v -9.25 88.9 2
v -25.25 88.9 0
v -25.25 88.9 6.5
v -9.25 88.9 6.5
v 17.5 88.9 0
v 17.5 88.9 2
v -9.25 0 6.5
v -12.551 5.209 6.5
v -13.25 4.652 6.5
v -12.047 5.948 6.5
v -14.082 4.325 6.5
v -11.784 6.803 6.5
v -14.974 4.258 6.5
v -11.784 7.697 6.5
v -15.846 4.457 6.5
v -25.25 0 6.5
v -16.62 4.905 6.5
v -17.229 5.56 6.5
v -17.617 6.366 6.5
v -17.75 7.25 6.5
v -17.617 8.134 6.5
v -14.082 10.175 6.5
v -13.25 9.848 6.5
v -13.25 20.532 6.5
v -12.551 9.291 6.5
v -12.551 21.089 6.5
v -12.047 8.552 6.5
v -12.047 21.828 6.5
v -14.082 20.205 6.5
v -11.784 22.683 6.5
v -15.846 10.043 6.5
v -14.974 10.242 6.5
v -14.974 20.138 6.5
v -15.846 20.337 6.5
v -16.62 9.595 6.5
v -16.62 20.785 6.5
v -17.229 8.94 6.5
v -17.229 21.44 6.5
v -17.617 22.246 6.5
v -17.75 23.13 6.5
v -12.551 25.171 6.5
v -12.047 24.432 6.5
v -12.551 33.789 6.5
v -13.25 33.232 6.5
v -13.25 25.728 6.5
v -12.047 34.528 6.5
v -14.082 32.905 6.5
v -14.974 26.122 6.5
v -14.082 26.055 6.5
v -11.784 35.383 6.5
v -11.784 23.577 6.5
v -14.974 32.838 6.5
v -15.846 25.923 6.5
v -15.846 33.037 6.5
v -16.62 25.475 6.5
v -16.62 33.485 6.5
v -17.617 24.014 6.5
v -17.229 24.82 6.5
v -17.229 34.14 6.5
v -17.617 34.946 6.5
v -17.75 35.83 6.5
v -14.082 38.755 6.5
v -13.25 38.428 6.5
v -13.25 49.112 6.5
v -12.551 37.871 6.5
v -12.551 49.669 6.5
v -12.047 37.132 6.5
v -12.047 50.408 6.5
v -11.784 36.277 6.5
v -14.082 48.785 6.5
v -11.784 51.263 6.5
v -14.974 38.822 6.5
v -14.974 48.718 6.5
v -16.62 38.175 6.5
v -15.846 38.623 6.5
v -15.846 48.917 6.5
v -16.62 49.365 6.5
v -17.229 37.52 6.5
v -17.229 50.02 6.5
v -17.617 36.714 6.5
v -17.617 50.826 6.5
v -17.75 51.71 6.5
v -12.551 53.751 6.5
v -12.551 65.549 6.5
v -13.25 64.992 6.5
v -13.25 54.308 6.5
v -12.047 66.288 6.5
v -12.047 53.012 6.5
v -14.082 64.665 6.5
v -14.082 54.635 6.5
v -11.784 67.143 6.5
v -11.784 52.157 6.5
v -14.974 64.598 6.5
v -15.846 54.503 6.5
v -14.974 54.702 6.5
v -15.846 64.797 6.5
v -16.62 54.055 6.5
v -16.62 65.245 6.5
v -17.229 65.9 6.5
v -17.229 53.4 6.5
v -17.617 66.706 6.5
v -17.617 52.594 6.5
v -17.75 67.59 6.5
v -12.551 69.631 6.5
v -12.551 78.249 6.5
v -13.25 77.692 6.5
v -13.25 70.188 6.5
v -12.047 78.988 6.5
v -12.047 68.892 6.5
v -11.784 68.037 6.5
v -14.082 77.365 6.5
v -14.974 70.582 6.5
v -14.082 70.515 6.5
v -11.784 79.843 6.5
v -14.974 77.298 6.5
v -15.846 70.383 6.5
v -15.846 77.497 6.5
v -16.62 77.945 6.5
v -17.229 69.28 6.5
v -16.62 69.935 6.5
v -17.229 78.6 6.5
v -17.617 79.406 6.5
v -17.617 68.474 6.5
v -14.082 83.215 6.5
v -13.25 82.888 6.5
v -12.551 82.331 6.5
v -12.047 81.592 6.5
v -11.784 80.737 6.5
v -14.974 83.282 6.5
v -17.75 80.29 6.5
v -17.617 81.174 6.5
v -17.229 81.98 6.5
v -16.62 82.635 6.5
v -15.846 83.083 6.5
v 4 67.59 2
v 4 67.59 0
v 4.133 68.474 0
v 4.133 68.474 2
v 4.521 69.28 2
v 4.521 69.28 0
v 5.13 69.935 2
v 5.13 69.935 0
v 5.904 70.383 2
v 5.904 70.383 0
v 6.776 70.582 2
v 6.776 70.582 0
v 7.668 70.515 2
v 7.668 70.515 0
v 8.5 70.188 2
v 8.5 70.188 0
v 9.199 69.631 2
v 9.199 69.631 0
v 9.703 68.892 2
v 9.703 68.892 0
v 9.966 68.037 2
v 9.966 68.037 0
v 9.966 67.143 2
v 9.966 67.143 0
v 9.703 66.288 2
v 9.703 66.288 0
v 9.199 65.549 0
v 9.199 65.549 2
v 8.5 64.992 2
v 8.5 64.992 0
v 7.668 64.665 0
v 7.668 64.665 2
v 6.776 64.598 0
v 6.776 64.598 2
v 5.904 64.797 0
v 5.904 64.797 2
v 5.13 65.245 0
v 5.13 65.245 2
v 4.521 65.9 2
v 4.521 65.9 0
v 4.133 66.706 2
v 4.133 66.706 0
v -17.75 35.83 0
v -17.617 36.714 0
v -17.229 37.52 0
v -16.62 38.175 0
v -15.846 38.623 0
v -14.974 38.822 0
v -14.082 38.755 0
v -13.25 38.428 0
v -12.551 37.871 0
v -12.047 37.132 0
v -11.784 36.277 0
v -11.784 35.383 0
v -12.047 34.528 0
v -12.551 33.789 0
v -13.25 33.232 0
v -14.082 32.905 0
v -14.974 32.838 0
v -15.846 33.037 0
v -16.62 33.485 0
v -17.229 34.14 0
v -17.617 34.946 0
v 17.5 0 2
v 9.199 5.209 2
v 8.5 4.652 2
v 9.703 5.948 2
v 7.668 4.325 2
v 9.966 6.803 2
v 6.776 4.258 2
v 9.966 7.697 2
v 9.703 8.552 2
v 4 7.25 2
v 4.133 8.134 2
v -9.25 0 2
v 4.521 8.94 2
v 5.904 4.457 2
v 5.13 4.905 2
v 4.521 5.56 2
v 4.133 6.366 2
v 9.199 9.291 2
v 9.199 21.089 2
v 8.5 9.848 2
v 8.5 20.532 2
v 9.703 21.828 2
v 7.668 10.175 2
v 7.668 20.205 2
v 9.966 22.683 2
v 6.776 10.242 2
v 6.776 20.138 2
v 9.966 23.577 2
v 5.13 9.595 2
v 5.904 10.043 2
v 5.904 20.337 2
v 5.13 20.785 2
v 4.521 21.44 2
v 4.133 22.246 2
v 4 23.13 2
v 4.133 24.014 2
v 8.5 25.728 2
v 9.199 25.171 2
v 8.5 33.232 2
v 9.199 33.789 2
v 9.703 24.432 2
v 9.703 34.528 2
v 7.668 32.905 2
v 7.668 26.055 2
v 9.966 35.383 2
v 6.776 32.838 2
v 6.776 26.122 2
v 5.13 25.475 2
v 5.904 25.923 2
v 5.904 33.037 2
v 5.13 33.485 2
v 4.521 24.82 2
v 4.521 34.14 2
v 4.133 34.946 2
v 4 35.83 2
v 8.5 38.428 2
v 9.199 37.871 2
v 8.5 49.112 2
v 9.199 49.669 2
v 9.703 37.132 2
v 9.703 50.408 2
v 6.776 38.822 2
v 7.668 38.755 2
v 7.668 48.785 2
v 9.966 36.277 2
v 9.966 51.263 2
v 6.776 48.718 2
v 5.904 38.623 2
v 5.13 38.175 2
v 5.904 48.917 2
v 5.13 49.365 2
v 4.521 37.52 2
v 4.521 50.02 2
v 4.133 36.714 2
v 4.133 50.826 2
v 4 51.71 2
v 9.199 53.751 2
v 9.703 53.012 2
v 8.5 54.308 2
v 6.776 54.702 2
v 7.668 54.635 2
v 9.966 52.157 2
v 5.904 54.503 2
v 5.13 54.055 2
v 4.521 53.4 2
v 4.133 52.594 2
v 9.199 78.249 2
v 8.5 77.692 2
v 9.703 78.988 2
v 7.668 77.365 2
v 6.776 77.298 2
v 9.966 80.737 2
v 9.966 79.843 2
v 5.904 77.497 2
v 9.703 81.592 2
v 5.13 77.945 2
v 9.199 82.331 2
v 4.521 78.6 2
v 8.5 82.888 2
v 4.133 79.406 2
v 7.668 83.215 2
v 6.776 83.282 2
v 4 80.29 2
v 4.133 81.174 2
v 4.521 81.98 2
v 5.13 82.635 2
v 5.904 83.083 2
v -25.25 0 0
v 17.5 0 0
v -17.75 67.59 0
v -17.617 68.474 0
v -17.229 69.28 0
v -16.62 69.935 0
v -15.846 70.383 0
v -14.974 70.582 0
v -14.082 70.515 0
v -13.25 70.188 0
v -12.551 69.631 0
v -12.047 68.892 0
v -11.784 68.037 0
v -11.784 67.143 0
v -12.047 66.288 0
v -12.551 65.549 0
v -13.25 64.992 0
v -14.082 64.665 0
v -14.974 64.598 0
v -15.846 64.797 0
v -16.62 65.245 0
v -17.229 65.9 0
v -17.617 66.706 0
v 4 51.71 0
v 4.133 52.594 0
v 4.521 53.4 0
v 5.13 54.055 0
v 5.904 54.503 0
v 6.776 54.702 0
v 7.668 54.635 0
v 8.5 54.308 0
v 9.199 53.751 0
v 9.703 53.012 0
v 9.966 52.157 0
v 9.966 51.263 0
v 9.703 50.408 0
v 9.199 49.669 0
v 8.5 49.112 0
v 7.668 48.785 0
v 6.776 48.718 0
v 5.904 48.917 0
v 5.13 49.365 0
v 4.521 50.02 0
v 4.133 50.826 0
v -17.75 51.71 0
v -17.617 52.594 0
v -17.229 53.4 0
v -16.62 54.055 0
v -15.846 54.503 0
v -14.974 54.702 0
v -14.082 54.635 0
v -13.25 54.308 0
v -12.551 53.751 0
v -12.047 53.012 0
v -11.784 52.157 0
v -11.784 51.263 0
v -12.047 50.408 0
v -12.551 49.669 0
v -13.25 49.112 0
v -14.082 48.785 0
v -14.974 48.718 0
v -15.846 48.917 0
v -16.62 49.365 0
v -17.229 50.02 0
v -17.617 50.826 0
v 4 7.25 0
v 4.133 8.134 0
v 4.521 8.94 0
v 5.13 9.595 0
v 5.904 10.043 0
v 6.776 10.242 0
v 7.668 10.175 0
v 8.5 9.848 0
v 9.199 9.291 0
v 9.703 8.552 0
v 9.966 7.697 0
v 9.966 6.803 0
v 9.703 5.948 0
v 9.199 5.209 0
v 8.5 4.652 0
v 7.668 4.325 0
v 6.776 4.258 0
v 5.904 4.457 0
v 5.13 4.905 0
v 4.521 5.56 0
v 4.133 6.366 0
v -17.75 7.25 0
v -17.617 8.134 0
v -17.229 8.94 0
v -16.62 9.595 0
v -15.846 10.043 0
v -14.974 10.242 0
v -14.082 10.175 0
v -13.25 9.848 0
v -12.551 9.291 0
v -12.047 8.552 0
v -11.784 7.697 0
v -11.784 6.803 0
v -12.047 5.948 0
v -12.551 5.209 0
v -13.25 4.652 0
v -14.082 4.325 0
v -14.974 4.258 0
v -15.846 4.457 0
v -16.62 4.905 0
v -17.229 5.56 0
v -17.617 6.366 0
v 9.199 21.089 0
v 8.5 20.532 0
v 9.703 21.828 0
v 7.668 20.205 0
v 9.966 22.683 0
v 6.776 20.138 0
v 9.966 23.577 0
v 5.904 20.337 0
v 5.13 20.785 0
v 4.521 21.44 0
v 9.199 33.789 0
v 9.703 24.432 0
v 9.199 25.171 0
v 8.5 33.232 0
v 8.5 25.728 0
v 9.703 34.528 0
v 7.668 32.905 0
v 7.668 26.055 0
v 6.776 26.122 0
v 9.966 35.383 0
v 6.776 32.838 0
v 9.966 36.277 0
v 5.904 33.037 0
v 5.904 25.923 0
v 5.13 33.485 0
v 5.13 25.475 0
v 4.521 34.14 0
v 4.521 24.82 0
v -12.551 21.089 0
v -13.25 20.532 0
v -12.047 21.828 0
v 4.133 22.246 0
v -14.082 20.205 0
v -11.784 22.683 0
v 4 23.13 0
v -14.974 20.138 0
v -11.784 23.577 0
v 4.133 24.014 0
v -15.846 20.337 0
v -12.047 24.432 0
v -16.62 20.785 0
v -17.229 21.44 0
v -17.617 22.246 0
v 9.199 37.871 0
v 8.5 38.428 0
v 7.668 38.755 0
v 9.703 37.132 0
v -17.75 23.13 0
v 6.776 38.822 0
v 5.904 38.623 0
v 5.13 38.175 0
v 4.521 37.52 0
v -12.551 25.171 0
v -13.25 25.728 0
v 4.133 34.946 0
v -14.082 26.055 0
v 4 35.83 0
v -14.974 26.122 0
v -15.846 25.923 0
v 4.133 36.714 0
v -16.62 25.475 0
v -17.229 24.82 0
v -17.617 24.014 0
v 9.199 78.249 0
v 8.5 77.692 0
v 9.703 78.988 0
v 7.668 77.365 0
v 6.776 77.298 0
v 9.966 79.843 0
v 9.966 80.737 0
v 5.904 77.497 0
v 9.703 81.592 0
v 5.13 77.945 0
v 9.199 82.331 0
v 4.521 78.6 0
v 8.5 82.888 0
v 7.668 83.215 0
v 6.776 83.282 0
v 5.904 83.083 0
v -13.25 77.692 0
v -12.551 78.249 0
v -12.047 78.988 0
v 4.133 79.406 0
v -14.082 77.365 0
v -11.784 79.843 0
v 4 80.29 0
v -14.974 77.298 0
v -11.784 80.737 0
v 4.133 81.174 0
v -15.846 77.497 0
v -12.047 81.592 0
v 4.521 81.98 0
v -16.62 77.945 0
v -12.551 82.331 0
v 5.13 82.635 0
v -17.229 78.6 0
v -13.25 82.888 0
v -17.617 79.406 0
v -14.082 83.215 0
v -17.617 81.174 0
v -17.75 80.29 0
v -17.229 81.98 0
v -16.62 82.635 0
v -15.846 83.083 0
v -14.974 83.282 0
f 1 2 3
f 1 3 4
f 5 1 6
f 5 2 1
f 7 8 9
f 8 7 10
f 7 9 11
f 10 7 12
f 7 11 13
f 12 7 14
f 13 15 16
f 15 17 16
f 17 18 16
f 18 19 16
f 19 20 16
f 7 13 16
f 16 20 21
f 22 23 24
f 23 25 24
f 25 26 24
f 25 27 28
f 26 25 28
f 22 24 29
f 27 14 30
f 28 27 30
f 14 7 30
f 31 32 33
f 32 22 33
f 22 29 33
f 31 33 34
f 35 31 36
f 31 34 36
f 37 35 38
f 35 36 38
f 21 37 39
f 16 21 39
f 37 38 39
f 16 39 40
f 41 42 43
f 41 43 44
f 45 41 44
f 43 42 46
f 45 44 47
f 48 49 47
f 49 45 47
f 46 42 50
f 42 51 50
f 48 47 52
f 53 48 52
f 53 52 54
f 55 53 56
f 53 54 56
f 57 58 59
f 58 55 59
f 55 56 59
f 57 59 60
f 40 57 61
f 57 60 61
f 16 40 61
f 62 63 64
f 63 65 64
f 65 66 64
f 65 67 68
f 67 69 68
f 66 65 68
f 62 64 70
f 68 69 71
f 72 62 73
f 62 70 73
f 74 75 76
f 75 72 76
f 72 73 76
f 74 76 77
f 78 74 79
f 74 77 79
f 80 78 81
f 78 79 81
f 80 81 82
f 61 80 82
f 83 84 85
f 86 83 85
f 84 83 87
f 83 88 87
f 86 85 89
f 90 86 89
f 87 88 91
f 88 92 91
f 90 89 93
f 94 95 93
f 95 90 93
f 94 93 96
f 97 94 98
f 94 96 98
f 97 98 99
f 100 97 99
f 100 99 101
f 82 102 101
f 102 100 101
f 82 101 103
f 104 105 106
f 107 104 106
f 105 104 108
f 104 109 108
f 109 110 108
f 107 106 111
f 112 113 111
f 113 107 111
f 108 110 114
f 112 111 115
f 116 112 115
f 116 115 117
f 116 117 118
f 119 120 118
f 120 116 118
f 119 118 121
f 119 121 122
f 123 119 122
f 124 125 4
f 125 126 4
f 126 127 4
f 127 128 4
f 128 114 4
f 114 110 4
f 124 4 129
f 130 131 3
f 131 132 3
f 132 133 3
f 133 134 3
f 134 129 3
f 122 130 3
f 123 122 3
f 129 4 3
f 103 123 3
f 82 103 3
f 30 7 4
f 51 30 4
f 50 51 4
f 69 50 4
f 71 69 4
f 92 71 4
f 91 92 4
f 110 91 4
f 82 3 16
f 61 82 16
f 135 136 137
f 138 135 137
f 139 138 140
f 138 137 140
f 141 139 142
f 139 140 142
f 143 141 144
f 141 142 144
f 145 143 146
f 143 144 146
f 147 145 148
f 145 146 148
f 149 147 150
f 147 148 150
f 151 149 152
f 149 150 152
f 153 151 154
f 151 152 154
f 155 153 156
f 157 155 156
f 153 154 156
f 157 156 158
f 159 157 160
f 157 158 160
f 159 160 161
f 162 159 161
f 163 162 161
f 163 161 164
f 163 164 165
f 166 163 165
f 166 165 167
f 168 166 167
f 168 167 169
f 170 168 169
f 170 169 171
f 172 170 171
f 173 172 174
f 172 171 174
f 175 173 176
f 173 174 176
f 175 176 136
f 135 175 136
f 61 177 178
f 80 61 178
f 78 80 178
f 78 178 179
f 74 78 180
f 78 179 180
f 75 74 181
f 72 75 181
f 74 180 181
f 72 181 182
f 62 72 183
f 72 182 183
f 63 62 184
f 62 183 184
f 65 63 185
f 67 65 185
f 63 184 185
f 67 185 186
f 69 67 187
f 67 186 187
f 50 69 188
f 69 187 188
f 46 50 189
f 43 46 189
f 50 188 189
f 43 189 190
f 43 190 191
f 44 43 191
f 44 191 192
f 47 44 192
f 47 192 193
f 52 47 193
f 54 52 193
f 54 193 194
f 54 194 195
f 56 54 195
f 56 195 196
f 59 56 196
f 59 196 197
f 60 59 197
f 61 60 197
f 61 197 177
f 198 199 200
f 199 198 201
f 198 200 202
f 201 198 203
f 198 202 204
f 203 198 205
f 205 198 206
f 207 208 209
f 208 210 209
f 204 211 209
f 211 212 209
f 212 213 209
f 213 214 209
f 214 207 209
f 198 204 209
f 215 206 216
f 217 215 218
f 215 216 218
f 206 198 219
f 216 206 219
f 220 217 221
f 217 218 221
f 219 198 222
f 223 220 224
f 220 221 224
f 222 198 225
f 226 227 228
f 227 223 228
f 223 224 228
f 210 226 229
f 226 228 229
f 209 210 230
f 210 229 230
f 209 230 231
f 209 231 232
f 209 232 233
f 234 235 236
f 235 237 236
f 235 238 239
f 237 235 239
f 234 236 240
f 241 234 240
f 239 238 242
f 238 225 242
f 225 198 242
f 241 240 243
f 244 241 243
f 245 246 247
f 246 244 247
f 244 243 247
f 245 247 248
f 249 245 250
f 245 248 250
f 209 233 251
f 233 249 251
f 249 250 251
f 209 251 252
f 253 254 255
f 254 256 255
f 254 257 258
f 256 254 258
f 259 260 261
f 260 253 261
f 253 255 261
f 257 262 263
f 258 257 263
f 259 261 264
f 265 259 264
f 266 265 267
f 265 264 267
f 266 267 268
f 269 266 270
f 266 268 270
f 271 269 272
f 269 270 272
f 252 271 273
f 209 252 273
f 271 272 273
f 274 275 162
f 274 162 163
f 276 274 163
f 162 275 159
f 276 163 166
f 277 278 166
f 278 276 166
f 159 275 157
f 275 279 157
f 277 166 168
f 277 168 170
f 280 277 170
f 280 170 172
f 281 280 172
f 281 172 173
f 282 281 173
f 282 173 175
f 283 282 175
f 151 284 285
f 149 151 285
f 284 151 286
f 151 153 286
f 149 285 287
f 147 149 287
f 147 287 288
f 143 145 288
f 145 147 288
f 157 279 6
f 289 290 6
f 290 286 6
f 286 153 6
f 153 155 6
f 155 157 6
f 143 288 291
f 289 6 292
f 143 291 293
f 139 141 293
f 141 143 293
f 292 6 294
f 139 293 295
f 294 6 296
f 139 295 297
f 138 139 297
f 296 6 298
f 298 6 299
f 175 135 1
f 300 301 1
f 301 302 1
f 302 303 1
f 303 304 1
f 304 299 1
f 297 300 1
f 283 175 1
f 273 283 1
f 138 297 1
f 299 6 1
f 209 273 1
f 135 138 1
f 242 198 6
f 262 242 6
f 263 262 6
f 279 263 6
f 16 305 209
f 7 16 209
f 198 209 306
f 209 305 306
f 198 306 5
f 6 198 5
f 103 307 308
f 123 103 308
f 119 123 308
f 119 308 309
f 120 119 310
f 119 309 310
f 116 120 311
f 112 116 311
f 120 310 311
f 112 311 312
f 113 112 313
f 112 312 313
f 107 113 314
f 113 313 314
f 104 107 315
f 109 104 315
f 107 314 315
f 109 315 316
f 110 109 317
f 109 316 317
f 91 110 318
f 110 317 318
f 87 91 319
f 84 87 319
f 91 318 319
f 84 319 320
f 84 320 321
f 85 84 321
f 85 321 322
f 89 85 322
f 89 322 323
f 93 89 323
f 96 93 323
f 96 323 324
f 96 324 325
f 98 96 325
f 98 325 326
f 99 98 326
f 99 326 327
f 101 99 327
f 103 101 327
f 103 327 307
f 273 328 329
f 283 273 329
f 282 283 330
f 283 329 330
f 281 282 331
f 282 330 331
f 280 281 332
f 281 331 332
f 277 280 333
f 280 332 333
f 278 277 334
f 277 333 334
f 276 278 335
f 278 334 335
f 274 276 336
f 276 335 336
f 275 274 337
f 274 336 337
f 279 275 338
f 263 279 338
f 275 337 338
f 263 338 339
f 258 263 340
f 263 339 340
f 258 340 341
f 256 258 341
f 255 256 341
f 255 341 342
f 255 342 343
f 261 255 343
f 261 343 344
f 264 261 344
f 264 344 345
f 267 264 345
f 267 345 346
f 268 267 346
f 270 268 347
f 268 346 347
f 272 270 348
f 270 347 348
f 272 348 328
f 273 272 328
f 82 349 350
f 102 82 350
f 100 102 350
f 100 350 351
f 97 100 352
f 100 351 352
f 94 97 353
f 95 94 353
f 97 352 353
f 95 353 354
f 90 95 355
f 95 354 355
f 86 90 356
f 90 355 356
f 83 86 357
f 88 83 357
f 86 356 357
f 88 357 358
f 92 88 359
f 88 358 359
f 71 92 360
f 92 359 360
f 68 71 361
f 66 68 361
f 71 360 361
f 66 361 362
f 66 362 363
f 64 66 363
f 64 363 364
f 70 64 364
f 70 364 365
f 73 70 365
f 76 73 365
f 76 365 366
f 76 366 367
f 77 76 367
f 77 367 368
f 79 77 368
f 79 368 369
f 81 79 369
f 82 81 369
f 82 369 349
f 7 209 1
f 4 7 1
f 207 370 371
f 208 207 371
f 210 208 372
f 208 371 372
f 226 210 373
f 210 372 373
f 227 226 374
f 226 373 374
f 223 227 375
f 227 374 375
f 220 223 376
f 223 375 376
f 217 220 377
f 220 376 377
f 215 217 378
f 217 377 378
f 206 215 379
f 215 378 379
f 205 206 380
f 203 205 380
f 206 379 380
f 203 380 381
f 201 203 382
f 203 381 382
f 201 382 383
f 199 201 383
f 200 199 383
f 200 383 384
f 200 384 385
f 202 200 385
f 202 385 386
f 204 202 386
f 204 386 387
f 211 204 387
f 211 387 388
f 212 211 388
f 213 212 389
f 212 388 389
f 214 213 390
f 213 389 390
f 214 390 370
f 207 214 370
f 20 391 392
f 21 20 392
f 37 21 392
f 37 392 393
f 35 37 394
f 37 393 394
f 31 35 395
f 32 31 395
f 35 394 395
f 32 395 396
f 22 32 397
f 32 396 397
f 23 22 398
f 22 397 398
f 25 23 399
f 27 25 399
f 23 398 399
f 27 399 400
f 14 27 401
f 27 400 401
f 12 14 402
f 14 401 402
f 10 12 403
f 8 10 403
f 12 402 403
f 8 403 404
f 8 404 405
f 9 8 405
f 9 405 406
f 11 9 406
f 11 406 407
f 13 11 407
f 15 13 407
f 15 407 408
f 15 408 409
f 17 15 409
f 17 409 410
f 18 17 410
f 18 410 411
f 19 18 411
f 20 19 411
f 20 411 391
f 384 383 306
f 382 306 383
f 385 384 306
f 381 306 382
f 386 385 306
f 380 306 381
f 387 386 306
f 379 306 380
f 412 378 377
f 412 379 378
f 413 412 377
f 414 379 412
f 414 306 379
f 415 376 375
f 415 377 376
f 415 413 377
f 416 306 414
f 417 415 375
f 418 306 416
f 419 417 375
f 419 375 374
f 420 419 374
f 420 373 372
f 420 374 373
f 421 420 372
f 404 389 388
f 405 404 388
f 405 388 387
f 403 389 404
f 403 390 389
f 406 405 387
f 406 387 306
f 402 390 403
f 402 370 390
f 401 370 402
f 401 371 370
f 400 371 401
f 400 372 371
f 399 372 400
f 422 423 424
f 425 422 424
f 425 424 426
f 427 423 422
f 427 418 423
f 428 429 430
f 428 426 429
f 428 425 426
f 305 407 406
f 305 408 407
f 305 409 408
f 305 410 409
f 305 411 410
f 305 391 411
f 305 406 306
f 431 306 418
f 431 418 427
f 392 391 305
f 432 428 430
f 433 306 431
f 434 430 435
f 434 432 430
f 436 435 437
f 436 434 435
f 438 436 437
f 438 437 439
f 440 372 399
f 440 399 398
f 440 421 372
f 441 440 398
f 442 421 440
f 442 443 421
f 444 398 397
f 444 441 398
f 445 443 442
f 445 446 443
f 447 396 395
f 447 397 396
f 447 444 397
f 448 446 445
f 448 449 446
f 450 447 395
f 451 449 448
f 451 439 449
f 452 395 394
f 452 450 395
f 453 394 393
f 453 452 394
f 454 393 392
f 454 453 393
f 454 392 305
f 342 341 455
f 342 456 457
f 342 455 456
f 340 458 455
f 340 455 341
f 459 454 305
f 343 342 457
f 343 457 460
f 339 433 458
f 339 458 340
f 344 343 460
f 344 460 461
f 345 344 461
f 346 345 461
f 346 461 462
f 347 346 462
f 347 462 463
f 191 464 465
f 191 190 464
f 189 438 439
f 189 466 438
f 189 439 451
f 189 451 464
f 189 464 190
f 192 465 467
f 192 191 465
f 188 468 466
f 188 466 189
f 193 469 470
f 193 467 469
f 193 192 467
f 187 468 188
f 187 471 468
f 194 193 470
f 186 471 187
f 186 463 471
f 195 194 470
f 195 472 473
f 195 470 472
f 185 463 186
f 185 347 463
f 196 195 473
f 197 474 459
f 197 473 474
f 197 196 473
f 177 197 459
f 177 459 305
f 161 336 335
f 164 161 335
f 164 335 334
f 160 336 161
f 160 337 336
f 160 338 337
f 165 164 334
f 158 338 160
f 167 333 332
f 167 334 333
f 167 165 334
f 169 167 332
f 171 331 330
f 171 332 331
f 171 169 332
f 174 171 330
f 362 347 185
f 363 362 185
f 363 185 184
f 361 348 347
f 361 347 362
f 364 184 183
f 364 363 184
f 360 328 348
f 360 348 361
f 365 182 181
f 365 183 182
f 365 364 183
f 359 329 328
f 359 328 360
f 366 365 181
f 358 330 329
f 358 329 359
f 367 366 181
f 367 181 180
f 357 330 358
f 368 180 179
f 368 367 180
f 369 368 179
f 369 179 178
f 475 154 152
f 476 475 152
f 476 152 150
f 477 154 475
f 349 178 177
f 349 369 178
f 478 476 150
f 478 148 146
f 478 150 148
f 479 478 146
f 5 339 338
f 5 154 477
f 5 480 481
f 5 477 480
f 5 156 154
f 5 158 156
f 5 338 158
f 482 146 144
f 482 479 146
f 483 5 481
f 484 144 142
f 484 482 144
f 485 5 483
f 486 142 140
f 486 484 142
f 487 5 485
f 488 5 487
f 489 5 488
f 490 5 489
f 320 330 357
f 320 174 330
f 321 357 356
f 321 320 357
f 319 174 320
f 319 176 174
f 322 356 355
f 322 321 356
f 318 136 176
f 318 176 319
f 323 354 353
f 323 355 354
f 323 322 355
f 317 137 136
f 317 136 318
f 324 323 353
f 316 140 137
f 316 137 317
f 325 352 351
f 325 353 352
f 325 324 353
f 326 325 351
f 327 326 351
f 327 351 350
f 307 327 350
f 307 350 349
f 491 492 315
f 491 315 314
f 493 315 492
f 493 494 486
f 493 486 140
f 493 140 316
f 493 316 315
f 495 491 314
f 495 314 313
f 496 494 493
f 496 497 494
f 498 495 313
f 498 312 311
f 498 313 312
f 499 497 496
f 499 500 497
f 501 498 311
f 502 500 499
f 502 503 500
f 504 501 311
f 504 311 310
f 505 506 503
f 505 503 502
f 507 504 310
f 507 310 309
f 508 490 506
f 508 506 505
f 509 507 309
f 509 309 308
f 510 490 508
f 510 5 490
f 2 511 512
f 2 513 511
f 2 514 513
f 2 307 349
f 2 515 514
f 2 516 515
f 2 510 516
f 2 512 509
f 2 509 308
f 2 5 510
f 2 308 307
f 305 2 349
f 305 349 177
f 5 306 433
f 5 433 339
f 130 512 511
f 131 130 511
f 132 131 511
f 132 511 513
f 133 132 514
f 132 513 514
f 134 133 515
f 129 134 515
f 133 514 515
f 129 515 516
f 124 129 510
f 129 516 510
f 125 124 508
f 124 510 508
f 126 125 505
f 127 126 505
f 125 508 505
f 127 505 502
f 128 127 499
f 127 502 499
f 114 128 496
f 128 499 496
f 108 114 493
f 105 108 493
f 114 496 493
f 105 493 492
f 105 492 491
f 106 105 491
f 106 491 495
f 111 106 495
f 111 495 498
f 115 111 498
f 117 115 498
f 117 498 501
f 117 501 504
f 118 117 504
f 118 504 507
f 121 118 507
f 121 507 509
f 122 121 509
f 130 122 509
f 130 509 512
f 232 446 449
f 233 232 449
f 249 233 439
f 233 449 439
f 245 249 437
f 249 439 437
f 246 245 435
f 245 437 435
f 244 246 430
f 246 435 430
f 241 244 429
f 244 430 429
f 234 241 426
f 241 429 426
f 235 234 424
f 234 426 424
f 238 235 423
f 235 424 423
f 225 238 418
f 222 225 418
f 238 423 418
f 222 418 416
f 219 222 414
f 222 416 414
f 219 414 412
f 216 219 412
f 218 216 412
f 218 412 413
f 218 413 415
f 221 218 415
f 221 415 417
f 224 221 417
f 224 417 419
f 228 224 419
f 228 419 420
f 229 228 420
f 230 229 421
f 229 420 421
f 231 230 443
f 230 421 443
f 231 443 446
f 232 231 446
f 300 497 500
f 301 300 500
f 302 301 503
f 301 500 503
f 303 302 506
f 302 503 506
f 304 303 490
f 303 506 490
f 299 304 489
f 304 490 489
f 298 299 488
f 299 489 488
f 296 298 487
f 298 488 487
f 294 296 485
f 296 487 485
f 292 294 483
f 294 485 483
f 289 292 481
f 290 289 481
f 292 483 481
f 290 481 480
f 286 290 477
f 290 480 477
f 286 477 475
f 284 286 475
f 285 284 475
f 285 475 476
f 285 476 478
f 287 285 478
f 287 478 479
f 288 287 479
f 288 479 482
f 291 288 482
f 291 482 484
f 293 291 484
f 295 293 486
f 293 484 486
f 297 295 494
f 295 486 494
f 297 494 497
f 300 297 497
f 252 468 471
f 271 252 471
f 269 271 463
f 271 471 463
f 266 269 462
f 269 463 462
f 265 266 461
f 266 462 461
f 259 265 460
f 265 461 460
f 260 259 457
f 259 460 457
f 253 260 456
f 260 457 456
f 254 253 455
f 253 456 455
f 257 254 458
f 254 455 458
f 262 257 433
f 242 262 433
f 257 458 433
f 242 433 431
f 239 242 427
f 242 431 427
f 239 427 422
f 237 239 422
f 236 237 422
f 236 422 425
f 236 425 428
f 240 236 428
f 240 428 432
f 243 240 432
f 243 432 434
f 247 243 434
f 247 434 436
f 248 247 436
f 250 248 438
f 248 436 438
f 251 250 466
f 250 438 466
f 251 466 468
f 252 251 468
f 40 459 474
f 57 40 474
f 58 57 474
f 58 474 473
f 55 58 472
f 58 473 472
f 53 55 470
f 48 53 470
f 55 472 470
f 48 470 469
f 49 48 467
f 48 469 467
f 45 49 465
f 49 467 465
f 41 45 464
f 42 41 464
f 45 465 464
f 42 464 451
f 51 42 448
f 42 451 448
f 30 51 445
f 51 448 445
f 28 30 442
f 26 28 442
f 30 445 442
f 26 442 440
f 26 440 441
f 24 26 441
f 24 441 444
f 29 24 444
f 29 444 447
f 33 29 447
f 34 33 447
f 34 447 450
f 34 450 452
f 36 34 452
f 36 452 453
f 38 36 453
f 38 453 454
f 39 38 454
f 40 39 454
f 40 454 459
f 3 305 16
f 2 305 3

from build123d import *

# Parameters (mm, degrees)
SKETCH1_W           = 42.75
SKETCH1_H           = 88.9
SKETCH1_W_2         = 9.5
SKETCH1_H_2         = 9.5
BOSS_EXTRUDE1_DEPTH = 2
SKETCH2_W           = 9.5
SKETCH2_H           = 9.5
SKETCH2_R           = 3
BOSS_EXTRUDE2_DEPTH = 2
SKETCH3_W           = 16
SKETCH3_H           = 88.9
SKETCH3_R           = 3
BOSS_EXTRUDE3_DEPTH = 6.5


with BuildPart() as part:
    # Sketch1 → Boss-Extrude1 (new body)
    with BuildSketch(Plane.XY):
        with Locations((-3.875, 44.45)):
            Rectangle(SKETCH1_W, SKETCH1_H)
        with Locations((7, 67.59)):
            Rectangle(SKETCH1_W_2, SKETCH1_H_2, mode=Mode.SUBTRACT)
        with Locations((7, 80.29)):
            Rectangle(SKETCH1_W_2, SKETCH1_H_2, mode=Mode.SUBTRACT)
        with Locations((-14.75, 80.29)):
            Rectangle(SKETCH1_W_2, SKETCH1_H_2, mode=Mode.SUBTRACT)
        with Locations((-14.75, 67.59)):
            Rectangle(SKETCH1_W_2, SKETCH1_H_2, mode=Mode.SUBTRACT)
        with Locations((-14.75, 7.25)):
            Rectangle(SKETCH1_W_2, SKETCH1_H_2, mode=Mode.SUBTRACT)
        with Locations((7, 51.71)):
            Rectangle(SKETCH1_W_2, SKETCH1_H_2, mode=Mode.SUBTRACT)
        with Locations((-14.75, 51.71)):
            Rectangle(SKETCH1_W_2, SKETCH1_H_2, mode=Mode.SUBTRACT)
        with Locations((7, 7.25)):
            Rectangle(SKETCH1_W_2, SKETCH1_H_2, mode=Mode.SUBTRACT)
        with Locations((7, 23.13)):
            Rectangle(SKETCH1_W_2, SKETCH1_H_2, mode=Mode.SUBTRACT)
        with Locations((-14.75, 23.13)):
            Rectangle(SKETCH1_W_2, SKETCH1_H_2, mode=Mode.SUBTRACT)
        with Locations((7, 35.83)):
            Rectangle(SKETCH1_W_2, SKETCH1_H_2, mode=Mode.SUBTRACT)
        with Locations((-14.75, 35.83)):
            Rectangle(SKETCH1_W_2, SKETCH1_H_2, mode=Mode.SUBTRACT)
    extrude(amount=BOSS_EXTRUDE1_DEPTH)

    # Sketch2 → Boss-Extrude2 (add)
    with BuildSketch(Plane(origin=(0, 0, 0), x_dir=(-1, 0, 0), z_dir=(0, 0, -1))):
        with Locations((-7, 80.29)):
            Rectangle(SKETCH2_W, SKETCH2_H)
        with Locations((-7, 80.29)):
            Circle(SKETCH2_R, mode=Mode.SUBTRACT)
        with Locations((14.75, 80.29)):
            Rectangle(SKETCH2_W, SKETCH2_H)
        with Locations((14.75, 80.29)):
            Circle(SKETCH2_R, mode=Mode.SUBTRACT)
        with Locations((-7, 67.59)):
            Rectangle(SKETCH2_W, SKETCH2_H)
        with Locations((-7, 67.59)):
            Circle(SKETCH2_R, mode=Mode.SUBTRACT)
        with Locations((14.75, 67.59)):
            Rectangle(SKETCH2_W, SKETCH2_H)
        with Locations((14.75, 67.59)):
            Circle(SKETCH2_R, mode=Mode.SUBTRACT)
        with Locations((-7, 51.71)):
            Rectangle(SKETCH2_W, SKETCH2_H)
        with Locations((-7, 51.71)):
            Circle(SKETCH2_R, mode=Mode.SUBTRACT)
        with Locations((14.75, 51.71)):
            Rectangle(SKETCH2_W, SKETCH2_H)
        with Locations((14.75, 51.71)):
            Circle(SKETCH2_R, mode=Mode.SUBTRACT)
        with Locations((-7, 35.83)):
            Rectangle(SKETCH2_W, SKETCH2_H)
        with Locations((-7, 35.83)):
            Circle(SKETCH2_R, mode=Mode.SUBTRACT)
        with Locations((14.75, 35.83)):
            Rectangle(SKETCH2_W, SKETCH2_H)
        with Locations((14.75, 35.83)):
            Circle(SKETCH2_R, mode=Mode.SUBTRACT)
        with Locations((-7, 23.13)):
            Rectangle(SKETCH2_W, SKETCH2_H)
        with Locations((-7, 23.13)):
            Circle(SKETCH2_R, mode=Mode.SUBTRACT)
        with Locations((14.75, 23.13)):
            Rectangle(SKETCH2_W, SKETCH2_H)
        with Locations((14.75, 23.13)):
            Circle(SKETCH2_R, mode=Mode.SUBTRACT)
        with Locations((14.75, 7.25)):
            Rectangle(SKETCH2_W, SKETCH2_H)
        with Locations((14.75, 7.25)):
            Circle(SKETCH2_R, mode=Mode.SUBTRACT)
        with Locations((-7, 7.25)):
            Rectangle(SKETCH2_W, SKETCH2_H)
        with Locations((-7, 7.25)):
            Circle(SKETCH2_R, mode=Mode.SUBTRACT)
    extrude(amount=-BOSS_EXTRUDE2_DEPTH)

    # Sketch3 → Boss-Extrude3 (add)
    with BuildSketch(Plane(origin=(0, 0, 0), x_dir=(-1, 0, 0), z_dir=(0, 0, -1))):
        with Locations((17.25, 44.45)):
            Rectangle(SKETCH3_W, SKETCH3_H)
        with Locations((14.75, 80.29)):
            Circle(SKETCH3_R, mode=Mode.SUBTRACT)
        with Locations((14.75, 67.59)):
            Circle(SKETCH3_R, mode=Mode.SUBTRACT)
        with Locations((14.75, 51.71)):
            Circle(SKETCH3_R, mode=Mode.SUBTRACT)
        with Locations((14.75, 35.83)):
            Circle(SKETCH3_R, mode=Mode.SUBTRACT)
        with Locations((14.75, 23.13)):
            Circle(SKETCH3_R, mode=Mode.SUBTRACT)
        with Locations((14.75, 7.25)):
            Circle(SKETCH3_R, mode=Mode.SUBTRACT)
    extrude(amount=-BOSS_EXTRUDE3_DEPTH)


solid = part.part
